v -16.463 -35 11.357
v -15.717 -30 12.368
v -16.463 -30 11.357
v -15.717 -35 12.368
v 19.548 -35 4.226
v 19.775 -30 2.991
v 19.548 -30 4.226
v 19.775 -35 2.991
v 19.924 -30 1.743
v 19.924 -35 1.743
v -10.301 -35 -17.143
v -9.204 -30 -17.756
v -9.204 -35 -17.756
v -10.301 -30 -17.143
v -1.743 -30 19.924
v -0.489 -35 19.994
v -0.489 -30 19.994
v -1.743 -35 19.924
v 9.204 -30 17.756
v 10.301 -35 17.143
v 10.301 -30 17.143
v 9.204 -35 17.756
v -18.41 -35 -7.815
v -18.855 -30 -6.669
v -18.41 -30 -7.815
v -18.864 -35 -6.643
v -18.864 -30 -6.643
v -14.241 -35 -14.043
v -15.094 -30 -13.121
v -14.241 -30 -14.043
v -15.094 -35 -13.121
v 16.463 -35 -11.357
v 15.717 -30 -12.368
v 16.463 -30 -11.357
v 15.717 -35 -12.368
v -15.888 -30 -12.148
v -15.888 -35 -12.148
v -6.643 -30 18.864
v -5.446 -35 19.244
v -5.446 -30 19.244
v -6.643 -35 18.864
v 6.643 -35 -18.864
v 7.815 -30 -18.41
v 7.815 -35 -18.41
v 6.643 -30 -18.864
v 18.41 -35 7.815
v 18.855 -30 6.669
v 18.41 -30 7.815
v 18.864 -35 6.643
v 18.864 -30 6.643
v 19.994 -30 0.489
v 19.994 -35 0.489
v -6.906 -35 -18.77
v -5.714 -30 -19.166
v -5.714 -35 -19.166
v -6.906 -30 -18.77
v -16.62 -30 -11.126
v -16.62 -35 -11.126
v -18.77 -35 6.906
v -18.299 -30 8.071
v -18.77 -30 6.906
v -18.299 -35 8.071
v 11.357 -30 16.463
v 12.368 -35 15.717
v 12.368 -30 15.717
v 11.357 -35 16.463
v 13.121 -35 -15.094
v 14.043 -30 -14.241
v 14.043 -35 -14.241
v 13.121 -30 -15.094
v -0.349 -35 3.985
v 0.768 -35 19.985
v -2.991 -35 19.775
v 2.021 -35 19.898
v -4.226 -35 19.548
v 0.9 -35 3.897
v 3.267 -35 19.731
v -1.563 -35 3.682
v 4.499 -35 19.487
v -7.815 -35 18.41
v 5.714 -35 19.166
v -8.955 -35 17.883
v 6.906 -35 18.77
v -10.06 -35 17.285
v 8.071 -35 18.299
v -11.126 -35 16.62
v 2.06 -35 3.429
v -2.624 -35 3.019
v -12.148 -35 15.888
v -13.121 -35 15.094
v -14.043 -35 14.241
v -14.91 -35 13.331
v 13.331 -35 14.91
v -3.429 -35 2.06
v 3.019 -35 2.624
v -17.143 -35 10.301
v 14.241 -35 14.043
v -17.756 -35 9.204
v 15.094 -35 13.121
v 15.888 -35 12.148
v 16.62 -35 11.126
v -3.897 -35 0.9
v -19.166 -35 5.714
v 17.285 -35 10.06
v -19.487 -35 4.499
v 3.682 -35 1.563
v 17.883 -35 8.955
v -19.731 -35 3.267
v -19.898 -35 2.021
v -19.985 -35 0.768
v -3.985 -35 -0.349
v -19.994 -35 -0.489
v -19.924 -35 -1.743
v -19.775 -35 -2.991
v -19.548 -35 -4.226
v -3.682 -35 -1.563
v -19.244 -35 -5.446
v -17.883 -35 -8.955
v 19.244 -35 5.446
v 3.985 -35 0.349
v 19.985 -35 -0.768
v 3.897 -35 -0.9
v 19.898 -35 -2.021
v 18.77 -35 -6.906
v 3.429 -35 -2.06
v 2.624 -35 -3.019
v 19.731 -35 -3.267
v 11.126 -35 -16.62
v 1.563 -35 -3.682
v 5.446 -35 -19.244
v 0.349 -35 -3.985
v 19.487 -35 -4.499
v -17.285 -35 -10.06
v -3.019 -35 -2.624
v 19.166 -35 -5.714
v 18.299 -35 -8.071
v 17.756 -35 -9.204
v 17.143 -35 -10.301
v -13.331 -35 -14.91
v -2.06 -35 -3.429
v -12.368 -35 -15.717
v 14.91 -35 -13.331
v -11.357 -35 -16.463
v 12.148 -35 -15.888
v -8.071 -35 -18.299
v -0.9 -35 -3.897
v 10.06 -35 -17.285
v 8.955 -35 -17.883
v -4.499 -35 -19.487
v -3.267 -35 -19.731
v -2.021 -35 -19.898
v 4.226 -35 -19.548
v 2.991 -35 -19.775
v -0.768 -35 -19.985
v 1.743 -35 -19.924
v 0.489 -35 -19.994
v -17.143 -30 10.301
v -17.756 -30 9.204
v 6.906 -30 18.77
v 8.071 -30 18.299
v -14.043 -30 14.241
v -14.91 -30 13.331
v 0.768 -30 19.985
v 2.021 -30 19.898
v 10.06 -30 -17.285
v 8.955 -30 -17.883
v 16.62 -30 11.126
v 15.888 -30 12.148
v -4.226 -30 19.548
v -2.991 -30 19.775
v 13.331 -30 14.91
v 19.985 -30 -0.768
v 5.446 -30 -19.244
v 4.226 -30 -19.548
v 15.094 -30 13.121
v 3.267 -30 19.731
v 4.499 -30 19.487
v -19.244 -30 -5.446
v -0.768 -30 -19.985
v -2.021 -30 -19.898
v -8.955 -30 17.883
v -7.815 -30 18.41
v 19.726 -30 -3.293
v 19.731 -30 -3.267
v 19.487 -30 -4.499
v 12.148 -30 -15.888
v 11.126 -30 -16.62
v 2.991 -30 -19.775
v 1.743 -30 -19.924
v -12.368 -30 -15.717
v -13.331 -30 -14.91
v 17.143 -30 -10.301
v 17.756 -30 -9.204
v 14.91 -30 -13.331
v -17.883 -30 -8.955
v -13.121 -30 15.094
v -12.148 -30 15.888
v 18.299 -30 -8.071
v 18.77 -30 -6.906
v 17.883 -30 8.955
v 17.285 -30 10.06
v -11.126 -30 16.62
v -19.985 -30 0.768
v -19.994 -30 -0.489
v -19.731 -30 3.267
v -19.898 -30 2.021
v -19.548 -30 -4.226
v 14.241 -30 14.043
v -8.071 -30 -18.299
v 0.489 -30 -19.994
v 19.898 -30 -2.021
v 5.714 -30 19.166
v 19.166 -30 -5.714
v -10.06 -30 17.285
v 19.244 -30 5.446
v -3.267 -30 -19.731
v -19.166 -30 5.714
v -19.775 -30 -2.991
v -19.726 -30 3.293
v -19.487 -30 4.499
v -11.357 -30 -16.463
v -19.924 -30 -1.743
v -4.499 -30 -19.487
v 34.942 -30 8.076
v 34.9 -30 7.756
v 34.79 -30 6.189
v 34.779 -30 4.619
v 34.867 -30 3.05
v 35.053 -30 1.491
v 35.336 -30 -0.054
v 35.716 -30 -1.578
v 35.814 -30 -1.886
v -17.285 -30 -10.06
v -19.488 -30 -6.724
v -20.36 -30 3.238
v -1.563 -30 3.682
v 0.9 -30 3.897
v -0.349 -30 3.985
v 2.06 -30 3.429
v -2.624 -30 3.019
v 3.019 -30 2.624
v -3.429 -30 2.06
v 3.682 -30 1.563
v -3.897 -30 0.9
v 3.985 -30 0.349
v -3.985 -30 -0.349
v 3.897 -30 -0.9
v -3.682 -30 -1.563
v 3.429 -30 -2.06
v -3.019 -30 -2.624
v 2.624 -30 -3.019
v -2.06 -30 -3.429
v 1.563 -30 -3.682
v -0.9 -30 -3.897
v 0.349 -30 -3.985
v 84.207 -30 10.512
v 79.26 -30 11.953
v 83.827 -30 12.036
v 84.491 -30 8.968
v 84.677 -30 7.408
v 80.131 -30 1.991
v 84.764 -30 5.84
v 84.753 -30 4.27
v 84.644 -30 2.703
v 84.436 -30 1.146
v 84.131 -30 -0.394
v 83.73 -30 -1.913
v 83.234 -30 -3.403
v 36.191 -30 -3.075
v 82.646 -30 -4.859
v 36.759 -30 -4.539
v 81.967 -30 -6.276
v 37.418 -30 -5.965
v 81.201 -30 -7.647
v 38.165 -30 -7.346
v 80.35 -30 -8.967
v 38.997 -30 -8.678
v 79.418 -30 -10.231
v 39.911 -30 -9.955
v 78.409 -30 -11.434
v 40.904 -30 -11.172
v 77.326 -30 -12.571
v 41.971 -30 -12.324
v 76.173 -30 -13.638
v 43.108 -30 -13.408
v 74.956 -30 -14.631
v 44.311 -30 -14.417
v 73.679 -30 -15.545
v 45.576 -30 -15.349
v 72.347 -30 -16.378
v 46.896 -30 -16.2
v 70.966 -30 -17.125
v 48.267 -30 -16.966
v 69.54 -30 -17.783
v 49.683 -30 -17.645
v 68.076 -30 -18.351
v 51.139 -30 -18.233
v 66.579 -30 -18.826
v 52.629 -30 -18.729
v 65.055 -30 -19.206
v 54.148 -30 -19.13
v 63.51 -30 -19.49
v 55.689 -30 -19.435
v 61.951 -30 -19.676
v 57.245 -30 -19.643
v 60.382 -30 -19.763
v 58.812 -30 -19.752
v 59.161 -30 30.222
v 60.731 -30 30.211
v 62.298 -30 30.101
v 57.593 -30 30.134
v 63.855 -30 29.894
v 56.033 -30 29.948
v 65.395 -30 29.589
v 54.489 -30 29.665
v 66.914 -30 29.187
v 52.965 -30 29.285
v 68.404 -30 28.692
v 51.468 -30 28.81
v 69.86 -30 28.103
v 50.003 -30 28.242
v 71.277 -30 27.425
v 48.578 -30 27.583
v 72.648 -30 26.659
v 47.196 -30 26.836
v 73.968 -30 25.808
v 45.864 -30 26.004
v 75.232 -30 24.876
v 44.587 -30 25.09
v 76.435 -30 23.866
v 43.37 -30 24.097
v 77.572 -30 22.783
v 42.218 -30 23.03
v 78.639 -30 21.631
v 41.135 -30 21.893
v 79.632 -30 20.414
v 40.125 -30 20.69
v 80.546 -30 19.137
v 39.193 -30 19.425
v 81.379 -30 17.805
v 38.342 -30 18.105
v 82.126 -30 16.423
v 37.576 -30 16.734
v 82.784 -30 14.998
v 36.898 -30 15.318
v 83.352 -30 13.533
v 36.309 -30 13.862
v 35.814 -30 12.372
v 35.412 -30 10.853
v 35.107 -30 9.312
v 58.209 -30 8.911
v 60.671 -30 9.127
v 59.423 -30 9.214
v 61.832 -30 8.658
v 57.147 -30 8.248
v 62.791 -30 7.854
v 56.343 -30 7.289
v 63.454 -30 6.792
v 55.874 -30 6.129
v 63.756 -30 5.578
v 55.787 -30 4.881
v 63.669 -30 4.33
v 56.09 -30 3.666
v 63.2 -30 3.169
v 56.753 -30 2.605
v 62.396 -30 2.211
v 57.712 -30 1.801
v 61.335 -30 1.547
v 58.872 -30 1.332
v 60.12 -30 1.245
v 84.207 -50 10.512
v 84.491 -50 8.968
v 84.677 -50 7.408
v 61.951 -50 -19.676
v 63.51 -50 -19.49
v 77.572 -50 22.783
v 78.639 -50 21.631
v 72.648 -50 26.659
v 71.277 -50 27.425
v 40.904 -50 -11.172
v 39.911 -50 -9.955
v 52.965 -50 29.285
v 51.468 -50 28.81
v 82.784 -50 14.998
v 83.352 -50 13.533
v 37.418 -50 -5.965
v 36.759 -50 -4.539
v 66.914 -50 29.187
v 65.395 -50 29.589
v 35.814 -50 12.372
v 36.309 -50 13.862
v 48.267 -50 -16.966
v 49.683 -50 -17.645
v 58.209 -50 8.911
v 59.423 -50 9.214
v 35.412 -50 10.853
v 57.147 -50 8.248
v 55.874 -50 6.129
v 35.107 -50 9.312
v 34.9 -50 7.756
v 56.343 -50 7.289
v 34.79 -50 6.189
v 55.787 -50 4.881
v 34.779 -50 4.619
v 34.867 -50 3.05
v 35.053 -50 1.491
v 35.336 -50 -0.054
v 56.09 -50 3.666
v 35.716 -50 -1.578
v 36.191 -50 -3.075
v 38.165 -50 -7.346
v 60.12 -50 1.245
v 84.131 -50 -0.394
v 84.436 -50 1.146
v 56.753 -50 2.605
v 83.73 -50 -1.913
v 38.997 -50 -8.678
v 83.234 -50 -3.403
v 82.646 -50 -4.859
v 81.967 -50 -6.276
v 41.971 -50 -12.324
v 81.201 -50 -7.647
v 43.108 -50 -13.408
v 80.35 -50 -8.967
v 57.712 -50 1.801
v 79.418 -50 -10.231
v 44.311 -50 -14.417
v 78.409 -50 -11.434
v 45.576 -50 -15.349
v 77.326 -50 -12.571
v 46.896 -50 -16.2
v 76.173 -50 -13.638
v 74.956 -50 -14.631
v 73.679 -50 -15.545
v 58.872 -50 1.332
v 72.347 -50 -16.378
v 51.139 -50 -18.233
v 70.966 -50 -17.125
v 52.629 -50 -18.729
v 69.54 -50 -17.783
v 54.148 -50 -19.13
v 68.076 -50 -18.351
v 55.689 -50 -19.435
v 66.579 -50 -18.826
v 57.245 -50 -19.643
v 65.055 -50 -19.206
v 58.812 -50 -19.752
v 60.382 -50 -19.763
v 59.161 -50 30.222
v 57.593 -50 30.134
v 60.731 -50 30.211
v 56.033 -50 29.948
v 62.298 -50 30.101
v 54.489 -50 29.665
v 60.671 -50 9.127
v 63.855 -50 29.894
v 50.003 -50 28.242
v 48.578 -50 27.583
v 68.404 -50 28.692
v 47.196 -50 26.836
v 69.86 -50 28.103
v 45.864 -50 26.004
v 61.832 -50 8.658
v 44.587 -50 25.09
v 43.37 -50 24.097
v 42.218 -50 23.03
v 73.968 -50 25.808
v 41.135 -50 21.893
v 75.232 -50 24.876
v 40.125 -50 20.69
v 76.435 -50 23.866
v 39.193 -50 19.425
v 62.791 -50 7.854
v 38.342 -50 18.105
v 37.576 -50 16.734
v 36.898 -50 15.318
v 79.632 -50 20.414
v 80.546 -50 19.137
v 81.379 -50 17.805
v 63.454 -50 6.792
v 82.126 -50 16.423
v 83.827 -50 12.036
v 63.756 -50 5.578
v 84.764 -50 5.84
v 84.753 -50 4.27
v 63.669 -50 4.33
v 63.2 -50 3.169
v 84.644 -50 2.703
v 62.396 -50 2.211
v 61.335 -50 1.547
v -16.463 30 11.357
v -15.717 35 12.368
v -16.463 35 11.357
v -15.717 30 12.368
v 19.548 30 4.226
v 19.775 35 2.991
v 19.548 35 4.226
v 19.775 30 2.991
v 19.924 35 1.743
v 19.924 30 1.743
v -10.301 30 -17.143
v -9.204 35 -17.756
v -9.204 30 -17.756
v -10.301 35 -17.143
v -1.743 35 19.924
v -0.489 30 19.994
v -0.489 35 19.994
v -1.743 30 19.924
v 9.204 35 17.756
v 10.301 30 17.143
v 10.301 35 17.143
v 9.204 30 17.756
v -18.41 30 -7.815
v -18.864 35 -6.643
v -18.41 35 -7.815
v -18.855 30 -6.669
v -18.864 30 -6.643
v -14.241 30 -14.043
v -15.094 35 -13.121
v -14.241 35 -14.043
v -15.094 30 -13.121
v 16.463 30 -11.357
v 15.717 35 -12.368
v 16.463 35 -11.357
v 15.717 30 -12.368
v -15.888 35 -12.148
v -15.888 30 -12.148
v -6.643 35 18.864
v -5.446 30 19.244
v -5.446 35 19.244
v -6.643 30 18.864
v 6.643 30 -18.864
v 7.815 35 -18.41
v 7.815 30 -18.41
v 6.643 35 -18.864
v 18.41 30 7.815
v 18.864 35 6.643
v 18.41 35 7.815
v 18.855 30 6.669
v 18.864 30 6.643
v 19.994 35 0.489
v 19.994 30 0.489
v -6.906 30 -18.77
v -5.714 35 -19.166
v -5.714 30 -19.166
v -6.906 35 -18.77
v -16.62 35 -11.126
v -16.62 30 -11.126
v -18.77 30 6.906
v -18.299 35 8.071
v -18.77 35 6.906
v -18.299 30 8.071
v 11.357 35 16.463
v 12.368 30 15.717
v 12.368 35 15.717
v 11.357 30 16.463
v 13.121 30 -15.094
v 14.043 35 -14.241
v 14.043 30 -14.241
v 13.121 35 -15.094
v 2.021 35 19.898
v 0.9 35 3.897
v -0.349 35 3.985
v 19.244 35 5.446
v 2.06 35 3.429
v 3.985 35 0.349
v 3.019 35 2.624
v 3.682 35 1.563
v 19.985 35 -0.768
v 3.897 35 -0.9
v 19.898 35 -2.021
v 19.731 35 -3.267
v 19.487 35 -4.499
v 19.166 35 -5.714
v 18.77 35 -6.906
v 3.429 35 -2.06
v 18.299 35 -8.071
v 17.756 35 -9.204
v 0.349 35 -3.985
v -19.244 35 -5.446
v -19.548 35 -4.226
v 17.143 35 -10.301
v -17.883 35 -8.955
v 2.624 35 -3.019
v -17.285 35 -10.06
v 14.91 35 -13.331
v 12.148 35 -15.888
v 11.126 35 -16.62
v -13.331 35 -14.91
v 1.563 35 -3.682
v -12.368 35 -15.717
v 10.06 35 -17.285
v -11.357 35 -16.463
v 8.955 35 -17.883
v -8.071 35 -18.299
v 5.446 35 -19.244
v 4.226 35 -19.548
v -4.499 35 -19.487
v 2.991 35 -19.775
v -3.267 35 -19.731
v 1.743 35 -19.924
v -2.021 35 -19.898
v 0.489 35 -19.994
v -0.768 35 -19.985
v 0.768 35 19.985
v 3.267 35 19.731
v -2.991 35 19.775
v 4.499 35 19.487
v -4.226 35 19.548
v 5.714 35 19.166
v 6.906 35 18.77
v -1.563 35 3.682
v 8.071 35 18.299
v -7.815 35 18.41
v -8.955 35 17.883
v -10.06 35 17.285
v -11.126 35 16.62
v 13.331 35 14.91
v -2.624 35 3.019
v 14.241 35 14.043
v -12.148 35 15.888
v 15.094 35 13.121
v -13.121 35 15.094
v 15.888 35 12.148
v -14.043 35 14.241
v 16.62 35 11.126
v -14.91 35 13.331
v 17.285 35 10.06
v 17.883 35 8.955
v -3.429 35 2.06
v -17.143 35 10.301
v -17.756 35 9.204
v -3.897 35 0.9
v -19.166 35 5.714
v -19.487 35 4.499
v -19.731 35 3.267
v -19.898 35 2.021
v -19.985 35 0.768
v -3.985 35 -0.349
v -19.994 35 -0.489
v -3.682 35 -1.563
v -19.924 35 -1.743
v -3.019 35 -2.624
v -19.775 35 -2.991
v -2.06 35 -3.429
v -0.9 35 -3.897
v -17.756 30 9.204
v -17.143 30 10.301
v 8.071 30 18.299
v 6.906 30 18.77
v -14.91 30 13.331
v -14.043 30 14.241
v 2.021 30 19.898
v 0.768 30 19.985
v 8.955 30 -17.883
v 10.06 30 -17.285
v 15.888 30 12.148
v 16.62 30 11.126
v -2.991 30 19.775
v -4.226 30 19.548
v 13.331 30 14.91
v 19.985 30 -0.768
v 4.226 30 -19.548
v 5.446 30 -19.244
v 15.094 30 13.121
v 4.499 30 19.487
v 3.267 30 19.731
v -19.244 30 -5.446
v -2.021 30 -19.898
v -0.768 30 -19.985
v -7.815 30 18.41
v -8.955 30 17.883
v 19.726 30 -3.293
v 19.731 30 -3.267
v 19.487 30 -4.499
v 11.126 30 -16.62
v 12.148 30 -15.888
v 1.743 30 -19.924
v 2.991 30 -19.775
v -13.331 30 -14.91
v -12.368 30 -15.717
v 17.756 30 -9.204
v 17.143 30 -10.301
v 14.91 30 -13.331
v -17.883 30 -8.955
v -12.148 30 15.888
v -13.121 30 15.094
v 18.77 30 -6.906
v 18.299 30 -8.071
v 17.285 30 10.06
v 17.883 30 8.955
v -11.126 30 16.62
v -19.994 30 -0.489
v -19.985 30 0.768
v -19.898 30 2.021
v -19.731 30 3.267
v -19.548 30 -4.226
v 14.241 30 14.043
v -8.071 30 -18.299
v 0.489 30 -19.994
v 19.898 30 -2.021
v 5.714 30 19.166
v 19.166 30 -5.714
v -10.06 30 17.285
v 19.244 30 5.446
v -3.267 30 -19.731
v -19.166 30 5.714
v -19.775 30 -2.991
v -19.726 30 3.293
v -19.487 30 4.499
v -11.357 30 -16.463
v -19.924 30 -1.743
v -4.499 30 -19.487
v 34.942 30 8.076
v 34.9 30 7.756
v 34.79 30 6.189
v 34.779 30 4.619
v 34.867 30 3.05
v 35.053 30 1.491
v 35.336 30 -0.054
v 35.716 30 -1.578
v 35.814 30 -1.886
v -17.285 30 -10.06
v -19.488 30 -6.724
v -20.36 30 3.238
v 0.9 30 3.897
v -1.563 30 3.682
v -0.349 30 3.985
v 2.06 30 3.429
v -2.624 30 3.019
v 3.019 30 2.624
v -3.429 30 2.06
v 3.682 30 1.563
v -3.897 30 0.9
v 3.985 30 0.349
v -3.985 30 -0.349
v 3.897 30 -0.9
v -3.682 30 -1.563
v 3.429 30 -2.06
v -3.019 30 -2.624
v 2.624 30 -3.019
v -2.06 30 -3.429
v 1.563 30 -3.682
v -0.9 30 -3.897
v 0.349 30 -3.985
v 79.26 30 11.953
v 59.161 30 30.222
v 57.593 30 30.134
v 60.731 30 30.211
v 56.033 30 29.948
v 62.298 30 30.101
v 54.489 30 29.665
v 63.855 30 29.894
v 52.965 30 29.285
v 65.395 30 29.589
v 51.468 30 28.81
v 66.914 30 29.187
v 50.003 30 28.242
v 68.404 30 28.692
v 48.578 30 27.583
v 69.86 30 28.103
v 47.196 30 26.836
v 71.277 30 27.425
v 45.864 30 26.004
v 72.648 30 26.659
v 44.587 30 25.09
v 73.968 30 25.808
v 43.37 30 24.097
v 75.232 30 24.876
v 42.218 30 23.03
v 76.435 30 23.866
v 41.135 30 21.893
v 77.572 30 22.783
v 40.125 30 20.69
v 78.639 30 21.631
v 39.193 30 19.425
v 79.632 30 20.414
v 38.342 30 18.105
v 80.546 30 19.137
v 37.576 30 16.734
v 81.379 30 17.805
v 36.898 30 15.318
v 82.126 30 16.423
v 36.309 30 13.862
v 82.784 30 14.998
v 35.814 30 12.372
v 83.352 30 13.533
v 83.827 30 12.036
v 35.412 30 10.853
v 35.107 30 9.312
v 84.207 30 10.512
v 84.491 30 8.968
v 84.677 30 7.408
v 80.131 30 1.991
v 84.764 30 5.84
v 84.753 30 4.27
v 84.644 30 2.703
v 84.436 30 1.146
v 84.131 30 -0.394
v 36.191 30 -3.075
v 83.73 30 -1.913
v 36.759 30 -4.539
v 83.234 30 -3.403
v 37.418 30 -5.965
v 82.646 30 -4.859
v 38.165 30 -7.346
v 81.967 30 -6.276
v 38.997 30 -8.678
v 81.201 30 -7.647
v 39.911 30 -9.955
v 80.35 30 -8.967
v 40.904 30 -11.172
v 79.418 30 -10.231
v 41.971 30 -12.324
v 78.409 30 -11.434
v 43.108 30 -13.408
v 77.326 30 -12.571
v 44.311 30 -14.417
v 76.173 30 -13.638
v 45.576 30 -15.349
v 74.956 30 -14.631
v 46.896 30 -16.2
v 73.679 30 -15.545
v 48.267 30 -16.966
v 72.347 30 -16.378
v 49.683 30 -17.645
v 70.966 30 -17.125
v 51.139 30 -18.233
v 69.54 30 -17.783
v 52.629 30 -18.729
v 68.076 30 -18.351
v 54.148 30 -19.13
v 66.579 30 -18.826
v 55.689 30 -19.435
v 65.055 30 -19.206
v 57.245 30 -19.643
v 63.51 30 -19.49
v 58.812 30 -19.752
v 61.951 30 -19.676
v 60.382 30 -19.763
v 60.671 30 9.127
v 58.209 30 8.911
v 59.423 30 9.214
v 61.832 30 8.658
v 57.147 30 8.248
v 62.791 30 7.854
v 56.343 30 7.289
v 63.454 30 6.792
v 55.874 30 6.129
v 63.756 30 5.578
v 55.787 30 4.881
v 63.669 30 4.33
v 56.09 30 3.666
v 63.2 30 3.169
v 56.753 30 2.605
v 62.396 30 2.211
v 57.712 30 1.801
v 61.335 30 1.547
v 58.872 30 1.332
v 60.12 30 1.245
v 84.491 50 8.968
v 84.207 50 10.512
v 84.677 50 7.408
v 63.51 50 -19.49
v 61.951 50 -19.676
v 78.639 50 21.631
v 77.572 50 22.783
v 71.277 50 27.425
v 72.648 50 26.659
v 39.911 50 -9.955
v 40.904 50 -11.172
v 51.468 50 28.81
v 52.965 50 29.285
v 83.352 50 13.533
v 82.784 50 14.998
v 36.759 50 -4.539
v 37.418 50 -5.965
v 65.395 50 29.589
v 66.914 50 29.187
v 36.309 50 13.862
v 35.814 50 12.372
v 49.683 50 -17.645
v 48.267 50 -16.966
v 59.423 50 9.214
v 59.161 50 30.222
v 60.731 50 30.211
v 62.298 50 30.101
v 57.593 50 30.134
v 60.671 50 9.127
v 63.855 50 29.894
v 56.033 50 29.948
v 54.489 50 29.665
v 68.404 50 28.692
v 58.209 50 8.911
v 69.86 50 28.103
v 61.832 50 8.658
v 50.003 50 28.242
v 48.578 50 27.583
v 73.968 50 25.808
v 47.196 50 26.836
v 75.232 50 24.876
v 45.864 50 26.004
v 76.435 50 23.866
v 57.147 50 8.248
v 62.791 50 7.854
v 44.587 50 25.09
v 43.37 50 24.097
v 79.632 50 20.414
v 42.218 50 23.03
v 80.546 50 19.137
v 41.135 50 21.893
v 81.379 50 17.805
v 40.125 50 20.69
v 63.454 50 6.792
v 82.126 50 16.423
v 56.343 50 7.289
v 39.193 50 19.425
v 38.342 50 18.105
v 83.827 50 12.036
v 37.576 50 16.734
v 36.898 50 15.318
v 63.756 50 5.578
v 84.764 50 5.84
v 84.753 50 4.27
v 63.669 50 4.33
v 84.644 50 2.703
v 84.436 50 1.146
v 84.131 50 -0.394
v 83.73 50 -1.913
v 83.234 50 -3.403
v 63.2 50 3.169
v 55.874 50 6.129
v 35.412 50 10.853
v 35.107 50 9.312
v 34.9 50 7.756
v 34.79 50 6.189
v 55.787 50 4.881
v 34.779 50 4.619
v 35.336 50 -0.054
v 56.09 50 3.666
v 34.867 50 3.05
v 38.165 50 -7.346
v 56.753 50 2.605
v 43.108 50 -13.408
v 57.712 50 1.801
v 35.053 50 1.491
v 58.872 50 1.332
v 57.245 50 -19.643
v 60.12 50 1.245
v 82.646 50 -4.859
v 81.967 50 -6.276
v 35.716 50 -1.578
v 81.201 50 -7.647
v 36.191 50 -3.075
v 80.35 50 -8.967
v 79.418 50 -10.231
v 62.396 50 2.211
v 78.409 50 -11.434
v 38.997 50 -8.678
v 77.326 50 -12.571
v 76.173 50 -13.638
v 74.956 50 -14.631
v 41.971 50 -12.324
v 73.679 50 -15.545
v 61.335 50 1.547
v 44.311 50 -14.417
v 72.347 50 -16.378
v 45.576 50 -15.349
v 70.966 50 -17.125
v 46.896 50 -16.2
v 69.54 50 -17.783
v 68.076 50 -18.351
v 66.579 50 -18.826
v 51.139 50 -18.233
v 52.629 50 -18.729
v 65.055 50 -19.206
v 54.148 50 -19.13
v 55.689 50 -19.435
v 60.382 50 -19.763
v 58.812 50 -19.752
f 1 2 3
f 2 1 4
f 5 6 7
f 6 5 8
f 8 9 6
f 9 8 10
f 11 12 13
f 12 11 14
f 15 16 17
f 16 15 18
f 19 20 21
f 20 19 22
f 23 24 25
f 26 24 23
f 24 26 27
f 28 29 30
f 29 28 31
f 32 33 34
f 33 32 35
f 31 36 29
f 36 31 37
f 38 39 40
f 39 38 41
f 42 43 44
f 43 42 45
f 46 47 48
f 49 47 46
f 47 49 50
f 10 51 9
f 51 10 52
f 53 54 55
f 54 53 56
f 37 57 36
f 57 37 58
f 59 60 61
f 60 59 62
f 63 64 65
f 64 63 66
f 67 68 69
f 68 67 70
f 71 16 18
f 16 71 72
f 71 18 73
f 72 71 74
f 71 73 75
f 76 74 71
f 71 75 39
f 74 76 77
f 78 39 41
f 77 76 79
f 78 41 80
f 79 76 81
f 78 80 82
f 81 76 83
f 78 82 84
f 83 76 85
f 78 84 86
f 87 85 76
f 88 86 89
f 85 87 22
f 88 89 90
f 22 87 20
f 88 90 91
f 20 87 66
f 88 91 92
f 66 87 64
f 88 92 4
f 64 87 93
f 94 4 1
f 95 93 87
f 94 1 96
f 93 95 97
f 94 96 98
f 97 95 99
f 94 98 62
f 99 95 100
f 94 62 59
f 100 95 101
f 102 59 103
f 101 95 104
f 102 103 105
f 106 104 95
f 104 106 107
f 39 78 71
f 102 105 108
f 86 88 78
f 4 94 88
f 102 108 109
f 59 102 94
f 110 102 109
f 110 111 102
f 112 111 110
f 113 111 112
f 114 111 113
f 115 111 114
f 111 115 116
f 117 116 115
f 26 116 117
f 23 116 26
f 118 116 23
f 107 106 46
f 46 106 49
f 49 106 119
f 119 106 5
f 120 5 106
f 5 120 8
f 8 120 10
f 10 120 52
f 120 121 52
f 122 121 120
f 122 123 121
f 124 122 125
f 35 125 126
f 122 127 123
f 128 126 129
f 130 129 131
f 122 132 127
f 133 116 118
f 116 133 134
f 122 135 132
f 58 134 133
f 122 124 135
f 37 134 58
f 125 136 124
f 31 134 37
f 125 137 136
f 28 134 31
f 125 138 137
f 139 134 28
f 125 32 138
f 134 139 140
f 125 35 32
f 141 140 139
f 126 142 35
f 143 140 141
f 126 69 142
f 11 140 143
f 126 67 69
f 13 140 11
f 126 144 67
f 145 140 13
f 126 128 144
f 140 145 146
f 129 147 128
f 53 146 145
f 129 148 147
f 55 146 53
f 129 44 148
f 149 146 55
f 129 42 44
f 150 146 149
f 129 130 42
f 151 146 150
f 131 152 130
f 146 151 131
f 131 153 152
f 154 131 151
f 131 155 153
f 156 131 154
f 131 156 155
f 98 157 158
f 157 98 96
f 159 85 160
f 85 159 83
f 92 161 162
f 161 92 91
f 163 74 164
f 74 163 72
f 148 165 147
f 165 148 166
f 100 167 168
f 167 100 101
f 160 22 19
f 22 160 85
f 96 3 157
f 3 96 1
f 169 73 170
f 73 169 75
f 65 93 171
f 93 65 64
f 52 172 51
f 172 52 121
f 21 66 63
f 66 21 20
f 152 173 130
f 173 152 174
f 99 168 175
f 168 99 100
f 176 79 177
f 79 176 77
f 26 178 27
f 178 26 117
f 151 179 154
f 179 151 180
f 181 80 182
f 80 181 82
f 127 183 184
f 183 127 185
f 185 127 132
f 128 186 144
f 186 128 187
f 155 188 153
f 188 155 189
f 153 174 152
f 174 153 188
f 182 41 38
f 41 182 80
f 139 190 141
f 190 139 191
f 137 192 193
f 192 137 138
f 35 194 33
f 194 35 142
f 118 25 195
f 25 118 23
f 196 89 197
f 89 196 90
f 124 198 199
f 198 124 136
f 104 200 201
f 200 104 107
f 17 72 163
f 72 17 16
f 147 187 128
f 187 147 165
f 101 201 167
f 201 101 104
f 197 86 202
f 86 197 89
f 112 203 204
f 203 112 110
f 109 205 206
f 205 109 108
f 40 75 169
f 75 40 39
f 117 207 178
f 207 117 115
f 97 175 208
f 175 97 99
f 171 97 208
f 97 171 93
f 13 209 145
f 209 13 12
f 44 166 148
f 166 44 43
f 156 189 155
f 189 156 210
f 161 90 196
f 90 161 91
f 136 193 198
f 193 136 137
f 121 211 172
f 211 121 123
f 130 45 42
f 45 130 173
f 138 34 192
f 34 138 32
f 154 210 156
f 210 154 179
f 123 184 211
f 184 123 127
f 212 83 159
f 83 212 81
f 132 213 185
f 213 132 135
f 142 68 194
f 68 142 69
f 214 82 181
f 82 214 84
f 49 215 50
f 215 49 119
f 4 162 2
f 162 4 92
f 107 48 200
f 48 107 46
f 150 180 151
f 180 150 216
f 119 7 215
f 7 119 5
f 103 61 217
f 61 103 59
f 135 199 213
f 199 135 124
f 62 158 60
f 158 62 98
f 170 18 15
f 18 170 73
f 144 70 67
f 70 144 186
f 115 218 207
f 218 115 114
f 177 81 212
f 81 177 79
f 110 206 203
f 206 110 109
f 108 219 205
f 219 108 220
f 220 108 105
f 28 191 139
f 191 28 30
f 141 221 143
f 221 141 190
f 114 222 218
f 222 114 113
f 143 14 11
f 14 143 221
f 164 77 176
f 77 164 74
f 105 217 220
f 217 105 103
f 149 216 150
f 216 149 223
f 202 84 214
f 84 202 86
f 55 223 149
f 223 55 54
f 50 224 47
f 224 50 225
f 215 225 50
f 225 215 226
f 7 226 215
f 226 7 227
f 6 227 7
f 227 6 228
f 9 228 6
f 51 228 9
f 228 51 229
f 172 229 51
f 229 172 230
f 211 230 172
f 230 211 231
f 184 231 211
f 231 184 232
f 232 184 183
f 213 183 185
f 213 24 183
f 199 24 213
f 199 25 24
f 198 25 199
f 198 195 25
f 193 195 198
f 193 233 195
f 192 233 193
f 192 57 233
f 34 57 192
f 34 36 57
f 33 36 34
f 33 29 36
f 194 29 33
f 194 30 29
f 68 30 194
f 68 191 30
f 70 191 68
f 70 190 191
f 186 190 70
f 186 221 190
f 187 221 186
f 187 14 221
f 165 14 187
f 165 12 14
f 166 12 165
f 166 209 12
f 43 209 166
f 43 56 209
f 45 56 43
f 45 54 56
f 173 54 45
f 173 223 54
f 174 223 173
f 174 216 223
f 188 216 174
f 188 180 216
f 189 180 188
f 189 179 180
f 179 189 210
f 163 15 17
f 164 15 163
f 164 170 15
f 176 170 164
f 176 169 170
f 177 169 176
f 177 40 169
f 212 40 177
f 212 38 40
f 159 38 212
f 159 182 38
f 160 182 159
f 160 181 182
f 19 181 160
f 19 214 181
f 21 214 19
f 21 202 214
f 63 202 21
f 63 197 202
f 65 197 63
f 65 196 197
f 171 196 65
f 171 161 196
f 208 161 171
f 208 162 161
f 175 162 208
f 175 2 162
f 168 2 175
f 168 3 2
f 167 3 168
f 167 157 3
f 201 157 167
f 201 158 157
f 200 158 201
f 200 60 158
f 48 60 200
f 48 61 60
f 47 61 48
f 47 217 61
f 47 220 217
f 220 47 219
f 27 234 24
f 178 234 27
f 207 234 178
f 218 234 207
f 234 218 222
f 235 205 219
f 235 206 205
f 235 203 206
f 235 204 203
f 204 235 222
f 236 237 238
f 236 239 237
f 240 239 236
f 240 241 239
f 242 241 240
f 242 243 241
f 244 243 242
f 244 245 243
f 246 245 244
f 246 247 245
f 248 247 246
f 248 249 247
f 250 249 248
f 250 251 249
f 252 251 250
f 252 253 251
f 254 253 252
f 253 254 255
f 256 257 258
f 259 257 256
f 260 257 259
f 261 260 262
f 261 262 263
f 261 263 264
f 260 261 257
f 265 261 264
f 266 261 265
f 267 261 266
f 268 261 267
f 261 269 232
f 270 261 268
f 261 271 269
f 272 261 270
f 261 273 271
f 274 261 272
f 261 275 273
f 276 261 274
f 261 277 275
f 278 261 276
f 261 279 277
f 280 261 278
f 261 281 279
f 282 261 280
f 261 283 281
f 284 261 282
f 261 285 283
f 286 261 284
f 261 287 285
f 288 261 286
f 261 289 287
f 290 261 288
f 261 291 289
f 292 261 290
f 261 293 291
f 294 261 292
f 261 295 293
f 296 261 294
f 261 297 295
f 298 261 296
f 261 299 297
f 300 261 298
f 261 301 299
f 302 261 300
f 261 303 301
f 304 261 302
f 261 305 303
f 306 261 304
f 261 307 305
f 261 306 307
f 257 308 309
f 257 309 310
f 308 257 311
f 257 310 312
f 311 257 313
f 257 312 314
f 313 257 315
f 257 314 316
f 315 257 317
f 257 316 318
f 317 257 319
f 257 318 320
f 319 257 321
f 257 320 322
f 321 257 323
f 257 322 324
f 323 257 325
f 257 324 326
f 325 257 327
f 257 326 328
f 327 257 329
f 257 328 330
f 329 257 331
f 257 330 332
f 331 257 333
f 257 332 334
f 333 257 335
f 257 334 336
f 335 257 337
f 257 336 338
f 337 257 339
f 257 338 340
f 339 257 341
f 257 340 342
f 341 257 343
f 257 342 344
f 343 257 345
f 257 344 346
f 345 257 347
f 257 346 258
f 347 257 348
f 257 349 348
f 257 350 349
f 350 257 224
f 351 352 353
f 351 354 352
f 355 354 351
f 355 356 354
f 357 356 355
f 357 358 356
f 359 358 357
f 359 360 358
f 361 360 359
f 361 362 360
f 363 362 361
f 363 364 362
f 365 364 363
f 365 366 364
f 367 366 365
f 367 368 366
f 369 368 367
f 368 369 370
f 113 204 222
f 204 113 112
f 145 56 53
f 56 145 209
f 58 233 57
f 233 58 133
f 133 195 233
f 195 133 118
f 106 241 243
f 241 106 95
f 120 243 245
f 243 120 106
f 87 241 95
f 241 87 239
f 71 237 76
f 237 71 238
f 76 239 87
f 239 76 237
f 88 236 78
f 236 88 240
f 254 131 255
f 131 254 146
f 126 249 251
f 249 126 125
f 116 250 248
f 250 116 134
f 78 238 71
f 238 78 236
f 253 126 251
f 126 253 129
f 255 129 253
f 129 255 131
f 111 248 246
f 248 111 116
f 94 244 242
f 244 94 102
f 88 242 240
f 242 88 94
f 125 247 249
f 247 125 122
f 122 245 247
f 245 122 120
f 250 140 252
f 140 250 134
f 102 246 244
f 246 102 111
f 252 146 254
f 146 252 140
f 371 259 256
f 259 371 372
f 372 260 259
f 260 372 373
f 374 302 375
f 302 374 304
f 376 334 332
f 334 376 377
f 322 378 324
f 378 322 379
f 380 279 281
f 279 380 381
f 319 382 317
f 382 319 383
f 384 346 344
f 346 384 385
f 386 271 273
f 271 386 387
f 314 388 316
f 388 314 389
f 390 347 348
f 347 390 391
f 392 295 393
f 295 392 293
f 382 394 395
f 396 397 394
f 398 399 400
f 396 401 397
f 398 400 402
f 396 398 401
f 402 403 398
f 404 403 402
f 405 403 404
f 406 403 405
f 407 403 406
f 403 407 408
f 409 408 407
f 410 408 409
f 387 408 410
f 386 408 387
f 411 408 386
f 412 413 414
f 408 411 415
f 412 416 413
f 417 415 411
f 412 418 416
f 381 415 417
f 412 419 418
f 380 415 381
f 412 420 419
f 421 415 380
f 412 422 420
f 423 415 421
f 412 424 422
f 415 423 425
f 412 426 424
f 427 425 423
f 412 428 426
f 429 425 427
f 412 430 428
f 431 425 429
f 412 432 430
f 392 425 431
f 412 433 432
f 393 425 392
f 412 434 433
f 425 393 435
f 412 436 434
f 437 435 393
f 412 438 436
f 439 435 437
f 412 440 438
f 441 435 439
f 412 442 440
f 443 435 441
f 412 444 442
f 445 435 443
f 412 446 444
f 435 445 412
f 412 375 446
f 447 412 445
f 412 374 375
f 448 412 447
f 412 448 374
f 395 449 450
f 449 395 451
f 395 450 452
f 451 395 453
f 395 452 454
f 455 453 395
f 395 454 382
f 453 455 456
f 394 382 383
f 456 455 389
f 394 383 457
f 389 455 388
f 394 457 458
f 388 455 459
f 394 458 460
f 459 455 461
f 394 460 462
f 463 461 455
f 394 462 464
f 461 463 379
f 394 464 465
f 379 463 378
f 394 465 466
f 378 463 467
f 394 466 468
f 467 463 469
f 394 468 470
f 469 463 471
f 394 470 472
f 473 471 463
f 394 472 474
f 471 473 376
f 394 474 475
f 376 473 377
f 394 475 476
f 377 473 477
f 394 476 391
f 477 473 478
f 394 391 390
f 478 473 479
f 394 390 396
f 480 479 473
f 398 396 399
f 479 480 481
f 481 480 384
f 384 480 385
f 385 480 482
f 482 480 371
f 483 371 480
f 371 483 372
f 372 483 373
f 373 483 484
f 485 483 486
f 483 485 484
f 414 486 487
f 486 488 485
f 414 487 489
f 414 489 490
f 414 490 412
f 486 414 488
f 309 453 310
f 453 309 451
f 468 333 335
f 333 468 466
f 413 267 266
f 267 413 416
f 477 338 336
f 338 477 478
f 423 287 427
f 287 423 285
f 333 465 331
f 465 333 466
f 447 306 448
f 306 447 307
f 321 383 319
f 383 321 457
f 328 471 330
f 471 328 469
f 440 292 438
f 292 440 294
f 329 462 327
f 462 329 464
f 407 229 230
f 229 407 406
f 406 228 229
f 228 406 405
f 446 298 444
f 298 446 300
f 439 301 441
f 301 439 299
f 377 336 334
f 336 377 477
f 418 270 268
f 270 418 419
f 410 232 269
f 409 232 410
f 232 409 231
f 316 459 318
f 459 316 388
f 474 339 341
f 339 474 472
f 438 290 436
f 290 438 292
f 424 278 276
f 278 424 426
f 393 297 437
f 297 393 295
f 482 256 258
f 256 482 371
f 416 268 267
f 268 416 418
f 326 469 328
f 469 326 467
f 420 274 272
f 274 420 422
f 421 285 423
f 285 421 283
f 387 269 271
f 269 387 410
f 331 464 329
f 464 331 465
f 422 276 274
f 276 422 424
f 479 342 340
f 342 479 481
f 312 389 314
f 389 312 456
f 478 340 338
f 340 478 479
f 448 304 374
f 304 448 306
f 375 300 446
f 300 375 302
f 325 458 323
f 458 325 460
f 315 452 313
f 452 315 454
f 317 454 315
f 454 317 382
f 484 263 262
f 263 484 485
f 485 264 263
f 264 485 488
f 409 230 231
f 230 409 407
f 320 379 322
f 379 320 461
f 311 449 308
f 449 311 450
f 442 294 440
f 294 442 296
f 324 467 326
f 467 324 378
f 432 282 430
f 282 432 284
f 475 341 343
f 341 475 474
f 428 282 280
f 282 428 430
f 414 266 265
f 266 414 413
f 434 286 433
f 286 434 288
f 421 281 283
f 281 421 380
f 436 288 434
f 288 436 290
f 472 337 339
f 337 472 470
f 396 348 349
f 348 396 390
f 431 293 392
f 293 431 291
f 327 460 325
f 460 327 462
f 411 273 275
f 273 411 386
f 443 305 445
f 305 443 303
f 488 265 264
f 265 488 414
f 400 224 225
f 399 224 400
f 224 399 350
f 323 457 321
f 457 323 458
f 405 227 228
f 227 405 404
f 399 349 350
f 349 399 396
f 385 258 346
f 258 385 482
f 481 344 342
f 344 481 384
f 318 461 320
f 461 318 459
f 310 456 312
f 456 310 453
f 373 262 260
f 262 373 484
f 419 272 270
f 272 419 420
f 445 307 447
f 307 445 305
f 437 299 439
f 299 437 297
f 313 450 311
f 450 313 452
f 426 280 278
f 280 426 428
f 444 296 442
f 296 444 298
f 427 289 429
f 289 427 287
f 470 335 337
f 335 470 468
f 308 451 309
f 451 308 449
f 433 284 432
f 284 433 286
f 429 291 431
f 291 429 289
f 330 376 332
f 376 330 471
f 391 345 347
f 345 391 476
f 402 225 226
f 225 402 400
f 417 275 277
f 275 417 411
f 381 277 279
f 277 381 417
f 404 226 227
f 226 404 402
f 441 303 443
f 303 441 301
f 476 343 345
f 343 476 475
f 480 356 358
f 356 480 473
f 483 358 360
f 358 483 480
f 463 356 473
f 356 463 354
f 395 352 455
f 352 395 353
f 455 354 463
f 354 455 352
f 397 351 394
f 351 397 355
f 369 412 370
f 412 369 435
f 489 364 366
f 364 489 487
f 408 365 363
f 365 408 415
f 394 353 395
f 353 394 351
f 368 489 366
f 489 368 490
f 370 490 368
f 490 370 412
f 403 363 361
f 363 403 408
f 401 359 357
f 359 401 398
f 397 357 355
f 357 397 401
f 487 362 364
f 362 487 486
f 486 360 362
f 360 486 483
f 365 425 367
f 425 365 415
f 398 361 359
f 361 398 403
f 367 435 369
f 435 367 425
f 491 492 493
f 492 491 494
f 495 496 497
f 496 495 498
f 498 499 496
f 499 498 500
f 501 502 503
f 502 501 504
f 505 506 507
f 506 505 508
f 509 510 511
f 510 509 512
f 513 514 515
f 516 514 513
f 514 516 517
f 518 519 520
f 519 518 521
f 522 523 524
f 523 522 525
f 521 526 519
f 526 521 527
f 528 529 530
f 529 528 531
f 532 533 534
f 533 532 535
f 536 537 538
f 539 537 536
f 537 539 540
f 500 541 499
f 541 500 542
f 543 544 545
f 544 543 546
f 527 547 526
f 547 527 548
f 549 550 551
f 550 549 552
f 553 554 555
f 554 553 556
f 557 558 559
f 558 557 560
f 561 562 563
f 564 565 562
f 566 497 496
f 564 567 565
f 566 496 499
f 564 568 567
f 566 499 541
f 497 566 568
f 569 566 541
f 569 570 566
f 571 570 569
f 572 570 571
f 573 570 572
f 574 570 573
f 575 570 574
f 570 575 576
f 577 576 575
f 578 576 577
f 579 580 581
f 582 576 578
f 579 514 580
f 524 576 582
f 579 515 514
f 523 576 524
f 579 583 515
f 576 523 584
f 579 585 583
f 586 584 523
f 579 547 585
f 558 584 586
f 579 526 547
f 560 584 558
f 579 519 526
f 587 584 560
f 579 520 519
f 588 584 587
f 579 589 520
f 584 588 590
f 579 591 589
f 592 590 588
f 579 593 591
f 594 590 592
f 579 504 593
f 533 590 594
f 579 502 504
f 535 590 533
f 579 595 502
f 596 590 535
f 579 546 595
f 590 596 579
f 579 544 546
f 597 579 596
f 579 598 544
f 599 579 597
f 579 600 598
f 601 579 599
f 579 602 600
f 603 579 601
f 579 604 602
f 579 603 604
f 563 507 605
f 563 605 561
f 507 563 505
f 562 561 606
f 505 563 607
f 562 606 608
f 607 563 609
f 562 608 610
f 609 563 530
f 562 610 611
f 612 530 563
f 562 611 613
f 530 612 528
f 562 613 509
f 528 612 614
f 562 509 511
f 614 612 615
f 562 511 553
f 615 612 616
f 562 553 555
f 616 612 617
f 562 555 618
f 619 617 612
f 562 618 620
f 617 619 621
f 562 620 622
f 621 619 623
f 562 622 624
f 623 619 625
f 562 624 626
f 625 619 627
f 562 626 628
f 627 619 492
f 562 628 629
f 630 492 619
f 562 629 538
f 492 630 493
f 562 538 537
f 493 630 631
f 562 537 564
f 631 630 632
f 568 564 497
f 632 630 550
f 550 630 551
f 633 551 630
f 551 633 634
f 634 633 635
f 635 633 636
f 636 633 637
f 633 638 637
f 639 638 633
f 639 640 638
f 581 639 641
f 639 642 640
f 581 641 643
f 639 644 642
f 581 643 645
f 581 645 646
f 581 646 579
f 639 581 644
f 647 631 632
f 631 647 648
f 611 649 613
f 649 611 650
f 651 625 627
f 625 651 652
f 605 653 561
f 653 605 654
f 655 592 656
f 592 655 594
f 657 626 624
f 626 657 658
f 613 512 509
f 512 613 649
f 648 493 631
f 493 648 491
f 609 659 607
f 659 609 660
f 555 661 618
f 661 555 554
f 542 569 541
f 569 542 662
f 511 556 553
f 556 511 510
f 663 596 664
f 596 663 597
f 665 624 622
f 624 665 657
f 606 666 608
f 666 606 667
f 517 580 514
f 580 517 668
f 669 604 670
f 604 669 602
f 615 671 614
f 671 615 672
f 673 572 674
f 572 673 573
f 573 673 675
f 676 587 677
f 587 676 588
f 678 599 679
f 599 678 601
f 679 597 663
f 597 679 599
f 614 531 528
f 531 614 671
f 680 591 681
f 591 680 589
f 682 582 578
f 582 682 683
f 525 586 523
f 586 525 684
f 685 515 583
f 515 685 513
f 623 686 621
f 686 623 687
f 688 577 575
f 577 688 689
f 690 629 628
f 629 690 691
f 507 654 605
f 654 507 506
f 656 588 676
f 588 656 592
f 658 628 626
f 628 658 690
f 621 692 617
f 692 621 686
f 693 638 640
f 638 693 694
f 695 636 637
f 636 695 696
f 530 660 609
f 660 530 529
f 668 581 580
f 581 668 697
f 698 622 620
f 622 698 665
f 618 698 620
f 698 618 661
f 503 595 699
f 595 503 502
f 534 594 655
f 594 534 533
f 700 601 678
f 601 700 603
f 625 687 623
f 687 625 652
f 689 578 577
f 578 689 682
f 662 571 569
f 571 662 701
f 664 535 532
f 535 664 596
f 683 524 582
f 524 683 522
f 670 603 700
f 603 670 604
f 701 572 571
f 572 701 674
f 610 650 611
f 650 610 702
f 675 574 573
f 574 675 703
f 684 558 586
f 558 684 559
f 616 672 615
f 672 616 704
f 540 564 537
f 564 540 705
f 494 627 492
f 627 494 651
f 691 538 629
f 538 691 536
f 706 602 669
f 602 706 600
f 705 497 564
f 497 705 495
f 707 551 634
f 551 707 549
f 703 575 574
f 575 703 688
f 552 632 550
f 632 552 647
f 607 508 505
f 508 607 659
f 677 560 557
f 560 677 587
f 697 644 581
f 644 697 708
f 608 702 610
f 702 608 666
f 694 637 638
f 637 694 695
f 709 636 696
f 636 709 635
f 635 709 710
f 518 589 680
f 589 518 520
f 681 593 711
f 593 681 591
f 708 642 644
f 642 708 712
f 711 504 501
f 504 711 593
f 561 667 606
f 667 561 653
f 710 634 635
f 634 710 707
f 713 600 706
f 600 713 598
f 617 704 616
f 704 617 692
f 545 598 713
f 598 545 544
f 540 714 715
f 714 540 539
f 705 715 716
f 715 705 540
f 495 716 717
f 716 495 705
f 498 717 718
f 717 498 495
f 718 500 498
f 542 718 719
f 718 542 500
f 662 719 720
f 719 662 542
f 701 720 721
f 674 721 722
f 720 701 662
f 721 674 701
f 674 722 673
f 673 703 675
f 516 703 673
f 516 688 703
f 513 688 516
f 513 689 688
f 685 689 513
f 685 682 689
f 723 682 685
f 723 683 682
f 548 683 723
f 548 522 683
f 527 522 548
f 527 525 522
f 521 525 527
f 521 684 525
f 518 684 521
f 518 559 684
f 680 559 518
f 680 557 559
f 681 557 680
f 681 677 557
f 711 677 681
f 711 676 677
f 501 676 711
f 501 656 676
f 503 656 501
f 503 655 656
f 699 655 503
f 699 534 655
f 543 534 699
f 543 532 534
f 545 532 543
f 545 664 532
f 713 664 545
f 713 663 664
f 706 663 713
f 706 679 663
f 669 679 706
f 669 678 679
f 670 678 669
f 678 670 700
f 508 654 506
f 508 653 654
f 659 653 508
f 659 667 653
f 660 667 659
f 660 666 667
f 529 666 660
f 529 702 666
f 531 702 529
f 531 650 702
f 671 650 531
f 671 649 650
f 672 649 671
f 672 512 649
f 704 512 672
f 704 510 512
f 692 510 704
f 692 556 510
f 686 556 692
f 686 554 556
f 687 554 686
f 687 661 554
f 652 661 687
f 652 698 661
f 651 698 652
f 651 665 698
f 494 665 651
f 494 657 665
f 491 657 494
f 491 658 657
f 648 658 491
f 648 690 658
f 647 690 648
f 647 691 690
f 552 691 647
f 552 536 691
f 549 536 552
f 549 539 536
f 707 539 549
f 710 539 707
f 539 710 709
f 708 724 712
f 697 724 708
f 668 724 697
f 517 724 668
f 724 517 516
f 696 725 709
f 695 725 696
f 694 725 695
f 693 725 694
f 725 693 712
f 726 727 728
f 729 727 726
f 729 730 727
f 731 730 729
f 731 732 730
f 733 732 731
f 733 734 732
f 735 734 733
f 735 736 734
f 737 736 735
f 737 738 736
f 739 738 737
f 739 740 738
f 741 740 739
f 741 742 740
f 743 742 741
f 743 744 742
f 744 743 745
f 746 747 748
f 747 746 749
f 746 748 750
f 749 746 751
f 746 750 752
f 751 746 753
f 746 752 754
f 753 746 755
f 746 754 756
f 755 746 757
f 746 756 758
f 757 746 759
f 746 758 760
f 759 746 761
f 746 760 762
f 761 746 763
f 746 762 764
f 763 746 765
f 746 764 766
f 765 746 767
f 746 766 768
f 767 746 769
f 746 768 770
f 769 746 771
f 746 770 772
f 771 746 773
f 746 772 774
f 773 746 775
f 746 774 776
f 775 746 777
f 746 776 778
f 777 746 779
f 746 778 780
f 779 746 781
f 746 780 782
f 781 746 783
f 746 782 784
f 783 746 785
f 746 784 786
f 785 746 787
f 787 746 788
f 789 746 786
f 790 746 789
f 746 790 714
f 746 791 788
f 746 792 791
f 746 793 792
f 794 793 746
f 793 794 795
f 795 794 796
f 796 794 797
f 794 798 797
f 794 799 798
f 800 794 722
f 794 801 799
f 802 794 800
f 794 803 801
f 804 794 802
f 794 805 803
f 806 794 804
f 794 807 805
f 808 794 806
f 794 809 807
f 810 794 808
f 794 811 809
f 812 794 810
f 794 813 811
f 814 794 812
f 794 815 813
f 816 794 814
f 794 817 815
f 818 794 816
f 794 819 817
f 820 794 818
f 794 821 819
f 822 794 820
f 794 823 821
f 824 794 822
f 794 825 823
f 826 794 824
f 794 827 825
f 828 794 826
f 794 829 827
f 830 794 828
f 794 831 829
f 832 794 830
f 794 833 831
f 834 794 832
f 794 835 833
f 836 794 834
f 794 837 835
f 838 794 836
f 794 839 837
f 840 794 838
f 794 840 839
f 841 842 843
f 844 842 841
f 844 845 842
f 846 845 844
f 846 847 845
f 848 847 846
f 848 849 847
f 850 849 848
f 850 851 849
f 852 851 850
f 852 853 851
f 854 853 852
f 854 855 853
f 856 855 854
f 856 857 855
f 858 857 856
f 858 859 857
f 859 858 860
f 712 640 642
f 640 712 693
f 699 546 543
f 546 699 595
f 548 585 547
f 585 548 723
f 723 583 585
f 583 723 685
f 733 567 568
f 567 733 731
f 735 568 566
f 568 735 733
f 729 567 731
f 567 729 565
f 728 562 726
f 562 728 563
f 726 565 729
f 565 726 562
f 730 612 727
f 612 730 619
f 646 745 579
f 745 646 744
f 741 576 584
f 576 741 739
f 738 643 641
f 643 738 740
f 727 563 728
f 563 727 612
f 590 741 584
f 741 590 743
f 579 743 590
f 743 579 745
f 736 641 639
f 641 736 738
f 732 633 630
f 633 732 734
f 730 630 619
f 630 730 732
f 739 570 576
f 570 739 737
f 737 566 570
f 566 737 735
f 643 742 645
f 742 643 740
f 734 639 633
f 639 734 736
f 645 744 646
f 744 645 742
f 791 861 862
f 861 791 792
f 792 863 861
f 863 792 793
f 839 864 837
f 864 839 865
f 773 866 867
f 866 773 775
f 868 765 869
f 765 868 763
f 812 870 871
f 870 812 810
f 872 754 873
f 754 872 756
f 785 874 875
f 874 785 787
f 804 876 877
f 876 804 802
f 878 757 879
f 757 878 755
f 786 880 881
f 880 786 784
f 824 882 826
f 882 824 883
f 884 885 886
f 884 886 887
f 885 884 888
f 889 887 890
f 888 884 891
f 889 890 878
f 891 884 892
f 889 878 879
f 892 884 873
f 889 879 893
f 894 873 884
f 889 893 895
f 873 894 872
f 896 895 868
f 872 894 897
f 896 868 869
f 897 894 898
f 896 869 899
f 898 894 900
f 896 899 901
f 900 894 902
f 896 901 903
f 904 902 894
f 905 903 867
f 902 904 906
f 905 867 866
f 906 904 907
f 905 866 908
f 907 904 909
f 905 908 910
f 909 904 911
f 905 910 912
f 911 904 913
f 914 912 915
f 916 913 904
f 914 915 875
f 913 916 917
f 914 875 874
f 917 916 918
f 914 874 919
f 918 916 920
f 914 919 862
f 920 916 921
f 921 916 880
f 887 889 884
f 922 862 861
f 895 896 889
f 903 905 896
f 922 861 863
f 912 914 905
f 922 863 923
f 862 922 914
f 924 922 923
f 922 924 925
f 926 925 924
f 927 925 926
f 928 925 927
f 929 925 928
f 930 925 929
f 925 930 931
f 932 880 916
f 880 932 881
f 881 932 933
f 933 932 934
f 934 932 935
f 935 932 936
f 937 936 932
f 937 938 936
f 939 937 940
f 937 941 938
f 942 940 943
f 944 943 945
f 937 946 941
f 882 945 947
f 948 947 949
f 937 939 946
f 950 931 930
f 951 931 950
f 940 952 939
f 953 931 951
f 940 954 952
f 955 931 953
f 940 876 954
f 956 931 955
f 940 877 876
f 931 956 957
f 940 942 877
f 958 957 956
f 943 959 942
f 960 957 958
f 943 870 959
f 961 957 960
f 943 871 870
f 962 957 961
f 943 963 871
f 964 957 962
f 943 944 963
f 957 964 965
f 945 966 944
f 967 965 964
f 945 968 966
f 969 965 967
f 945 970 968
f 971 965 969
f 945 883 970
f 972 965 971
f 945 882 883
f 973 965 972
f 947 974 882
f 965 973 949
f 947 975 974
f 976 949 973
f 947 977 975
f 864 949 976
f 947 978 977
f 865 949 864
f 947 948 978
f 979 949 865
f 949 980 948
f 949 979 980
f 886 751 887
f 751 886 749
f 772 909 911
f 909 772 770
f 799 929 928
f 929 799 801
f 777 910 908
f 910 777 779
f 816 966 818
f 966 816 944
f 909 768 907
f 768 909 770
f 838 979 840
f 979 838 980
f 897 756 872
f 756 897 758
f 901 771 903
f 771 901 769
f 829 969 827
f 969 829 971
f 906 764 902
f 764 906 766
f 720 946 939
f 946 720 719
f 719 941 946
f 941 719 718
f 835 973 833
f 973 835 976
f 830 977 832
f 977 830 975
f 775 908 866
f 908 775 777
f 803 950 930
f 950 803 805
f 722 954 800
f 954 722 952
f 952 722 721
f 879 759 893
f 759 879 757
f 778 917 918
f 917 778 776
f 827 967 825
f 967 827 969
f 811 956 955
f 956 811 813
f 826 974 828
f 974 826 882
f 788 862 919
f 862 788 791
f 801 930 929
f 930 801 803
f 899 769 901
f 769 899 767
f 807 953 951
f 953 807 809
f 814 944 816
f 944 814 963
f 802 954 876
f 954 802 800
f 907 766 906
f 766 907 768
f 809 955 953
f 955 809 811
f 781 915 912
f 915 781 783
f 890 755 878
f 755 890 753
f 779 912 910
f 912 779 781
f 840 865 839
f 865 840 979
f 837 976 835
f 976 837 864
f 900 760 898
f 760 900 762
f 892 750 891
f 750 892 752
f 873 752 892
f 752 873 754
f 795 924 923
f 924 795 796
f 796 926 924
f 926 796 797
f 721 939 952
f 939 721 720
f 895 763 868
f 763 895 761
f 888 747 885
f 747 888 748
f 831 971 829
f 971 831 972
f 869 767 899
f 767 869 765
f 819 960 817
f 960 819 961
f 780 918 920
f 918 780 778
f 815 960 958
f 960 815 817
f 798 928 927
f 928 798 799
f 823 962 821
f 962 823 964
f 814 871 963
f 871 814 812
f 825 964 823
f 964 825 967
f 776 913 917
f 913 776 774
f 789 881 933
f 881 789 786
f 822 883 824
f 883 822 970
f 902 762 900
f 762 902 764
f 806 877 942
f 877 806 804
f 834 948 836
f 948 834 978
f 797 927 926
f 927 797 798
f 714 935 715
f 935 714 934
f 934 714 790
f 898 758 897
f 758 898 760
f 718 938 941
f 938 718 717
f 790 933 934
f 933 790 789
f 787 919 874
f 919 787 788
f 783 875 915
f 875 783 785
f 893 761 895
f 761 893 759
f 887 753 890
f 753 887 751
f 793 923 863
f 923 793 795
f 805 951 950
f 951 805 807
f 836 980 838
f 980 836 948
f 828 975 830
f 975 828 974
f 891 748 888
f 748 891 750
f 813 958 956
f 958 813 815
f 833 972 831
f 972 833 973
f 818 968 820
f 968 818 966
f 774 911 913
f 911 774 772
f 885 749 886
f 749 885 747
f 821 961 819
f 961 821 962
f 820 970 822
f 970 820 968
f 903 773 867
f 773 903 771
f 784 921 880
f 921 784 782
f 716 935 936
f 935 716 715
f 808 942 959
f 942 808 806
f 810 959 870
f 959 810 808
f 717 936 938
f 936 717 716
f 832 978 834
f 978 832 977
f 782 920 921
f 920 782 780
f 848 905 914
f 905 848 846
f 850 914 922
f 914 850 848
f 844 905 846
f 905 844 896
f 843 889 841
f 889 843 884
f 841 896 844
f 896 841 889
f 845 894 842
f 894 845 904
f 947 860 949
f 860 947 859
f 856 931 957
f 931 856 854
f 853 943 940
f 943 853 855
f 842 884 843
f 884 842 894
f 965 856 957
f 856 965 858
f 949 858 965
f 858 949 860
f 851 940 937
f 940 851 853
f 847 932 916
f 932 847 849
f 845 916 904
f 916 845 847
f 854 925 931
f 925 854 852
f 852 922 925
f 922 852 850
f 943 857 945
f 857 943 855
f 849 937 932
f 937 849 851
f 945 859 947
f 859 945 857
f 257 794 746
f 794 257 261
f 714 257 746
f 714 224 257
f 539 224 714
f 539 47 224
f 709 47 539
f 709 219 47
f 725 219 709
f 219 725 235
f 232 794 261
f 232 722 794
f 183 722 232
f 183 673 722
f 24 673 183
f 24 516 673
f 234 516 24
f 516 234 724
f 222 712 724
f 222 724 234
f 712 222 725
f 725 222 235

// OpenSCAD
// file: rueda_simple_lib.scad
// Especificamos que el parámetro grosor por defecto será 5mm, el diámetro por defecto 40mm y el diámetro del eje de 8mm
module rueda_simple(grosor=5, diametro=40, diam_eje=8){
    // Cilindro con agujero central
    difference(){
        // Cilindro exterior
        cylinder(r=diametro/2, h=grosor, $fn=100);
        // Cilindro taladro central.
        cylinder(r=diam_eje/2, h=grosor*3, $fn=20, center=true);
        // NOTA: Multiplicamos por 3 la altura para asegurar que se
        //     atraviesa completamente la figura.
        }
    }


// Creamos una rueda simple sin parámetros usando valores por defecto):
translate([50, 0, 0]){
    rueda_simple();
}

// Añadimos una segunda rueda únicamente cambiando el grosor a 20
translate([100, 0, 0]){
    rueda_simple(grosor=20);
}

// Finalmente creamos otra rueda cambiando el grosor a 20
translate([150, 0, 0]){
    rueda_simple(grosor=20, diametro=20);
}
// main file
// En este ejemplo vamos a ver como utilizar los módulos externos en nuestra
//     aplicación.

// Importamos el fichero que tiene definido el módulo
use <rueda_simple_lib.scad>

// Con la libería de la rueda simple que hicimos en el ejemplo anterior,
//     vamos a hacer una especie de coche:
//rotate([0,0,0], center=true)
rotate([0, -5, 0])
union(){
// Definimos el chasis
translate([30,0,0])
cube([100, 60, 10], center=true);

// Definimos la rueda delantera izquierda del coche
translate([0, -30, 0])
rotate([90, 0, 0])
    rueda_simple();
    
// Definimos la rueda trasera izquierda del coche
translate([60, -30, 0])
rotate([90, 0, 0])
    rueda_simple(grosor=20, diametro=50);



// Las Ruedas del lado derecho, son simétricas respecto al eje Y, por lo que aplicamos un
//    mirroring de los mismos valores anteriores:
mirror([0, 1, 0]){
// Definimos la rueda delantera izquierda del coche
translate([0, -30, 0])
rotate([90, 0, 0])
    rueda_simple();
    
    


// Definimos la rueda trasera derecha del coche
translate([60, -30, 0])
rotate([90, 0, 0])
    rueda_simple(grosor=20, diametro=50);
}
}
